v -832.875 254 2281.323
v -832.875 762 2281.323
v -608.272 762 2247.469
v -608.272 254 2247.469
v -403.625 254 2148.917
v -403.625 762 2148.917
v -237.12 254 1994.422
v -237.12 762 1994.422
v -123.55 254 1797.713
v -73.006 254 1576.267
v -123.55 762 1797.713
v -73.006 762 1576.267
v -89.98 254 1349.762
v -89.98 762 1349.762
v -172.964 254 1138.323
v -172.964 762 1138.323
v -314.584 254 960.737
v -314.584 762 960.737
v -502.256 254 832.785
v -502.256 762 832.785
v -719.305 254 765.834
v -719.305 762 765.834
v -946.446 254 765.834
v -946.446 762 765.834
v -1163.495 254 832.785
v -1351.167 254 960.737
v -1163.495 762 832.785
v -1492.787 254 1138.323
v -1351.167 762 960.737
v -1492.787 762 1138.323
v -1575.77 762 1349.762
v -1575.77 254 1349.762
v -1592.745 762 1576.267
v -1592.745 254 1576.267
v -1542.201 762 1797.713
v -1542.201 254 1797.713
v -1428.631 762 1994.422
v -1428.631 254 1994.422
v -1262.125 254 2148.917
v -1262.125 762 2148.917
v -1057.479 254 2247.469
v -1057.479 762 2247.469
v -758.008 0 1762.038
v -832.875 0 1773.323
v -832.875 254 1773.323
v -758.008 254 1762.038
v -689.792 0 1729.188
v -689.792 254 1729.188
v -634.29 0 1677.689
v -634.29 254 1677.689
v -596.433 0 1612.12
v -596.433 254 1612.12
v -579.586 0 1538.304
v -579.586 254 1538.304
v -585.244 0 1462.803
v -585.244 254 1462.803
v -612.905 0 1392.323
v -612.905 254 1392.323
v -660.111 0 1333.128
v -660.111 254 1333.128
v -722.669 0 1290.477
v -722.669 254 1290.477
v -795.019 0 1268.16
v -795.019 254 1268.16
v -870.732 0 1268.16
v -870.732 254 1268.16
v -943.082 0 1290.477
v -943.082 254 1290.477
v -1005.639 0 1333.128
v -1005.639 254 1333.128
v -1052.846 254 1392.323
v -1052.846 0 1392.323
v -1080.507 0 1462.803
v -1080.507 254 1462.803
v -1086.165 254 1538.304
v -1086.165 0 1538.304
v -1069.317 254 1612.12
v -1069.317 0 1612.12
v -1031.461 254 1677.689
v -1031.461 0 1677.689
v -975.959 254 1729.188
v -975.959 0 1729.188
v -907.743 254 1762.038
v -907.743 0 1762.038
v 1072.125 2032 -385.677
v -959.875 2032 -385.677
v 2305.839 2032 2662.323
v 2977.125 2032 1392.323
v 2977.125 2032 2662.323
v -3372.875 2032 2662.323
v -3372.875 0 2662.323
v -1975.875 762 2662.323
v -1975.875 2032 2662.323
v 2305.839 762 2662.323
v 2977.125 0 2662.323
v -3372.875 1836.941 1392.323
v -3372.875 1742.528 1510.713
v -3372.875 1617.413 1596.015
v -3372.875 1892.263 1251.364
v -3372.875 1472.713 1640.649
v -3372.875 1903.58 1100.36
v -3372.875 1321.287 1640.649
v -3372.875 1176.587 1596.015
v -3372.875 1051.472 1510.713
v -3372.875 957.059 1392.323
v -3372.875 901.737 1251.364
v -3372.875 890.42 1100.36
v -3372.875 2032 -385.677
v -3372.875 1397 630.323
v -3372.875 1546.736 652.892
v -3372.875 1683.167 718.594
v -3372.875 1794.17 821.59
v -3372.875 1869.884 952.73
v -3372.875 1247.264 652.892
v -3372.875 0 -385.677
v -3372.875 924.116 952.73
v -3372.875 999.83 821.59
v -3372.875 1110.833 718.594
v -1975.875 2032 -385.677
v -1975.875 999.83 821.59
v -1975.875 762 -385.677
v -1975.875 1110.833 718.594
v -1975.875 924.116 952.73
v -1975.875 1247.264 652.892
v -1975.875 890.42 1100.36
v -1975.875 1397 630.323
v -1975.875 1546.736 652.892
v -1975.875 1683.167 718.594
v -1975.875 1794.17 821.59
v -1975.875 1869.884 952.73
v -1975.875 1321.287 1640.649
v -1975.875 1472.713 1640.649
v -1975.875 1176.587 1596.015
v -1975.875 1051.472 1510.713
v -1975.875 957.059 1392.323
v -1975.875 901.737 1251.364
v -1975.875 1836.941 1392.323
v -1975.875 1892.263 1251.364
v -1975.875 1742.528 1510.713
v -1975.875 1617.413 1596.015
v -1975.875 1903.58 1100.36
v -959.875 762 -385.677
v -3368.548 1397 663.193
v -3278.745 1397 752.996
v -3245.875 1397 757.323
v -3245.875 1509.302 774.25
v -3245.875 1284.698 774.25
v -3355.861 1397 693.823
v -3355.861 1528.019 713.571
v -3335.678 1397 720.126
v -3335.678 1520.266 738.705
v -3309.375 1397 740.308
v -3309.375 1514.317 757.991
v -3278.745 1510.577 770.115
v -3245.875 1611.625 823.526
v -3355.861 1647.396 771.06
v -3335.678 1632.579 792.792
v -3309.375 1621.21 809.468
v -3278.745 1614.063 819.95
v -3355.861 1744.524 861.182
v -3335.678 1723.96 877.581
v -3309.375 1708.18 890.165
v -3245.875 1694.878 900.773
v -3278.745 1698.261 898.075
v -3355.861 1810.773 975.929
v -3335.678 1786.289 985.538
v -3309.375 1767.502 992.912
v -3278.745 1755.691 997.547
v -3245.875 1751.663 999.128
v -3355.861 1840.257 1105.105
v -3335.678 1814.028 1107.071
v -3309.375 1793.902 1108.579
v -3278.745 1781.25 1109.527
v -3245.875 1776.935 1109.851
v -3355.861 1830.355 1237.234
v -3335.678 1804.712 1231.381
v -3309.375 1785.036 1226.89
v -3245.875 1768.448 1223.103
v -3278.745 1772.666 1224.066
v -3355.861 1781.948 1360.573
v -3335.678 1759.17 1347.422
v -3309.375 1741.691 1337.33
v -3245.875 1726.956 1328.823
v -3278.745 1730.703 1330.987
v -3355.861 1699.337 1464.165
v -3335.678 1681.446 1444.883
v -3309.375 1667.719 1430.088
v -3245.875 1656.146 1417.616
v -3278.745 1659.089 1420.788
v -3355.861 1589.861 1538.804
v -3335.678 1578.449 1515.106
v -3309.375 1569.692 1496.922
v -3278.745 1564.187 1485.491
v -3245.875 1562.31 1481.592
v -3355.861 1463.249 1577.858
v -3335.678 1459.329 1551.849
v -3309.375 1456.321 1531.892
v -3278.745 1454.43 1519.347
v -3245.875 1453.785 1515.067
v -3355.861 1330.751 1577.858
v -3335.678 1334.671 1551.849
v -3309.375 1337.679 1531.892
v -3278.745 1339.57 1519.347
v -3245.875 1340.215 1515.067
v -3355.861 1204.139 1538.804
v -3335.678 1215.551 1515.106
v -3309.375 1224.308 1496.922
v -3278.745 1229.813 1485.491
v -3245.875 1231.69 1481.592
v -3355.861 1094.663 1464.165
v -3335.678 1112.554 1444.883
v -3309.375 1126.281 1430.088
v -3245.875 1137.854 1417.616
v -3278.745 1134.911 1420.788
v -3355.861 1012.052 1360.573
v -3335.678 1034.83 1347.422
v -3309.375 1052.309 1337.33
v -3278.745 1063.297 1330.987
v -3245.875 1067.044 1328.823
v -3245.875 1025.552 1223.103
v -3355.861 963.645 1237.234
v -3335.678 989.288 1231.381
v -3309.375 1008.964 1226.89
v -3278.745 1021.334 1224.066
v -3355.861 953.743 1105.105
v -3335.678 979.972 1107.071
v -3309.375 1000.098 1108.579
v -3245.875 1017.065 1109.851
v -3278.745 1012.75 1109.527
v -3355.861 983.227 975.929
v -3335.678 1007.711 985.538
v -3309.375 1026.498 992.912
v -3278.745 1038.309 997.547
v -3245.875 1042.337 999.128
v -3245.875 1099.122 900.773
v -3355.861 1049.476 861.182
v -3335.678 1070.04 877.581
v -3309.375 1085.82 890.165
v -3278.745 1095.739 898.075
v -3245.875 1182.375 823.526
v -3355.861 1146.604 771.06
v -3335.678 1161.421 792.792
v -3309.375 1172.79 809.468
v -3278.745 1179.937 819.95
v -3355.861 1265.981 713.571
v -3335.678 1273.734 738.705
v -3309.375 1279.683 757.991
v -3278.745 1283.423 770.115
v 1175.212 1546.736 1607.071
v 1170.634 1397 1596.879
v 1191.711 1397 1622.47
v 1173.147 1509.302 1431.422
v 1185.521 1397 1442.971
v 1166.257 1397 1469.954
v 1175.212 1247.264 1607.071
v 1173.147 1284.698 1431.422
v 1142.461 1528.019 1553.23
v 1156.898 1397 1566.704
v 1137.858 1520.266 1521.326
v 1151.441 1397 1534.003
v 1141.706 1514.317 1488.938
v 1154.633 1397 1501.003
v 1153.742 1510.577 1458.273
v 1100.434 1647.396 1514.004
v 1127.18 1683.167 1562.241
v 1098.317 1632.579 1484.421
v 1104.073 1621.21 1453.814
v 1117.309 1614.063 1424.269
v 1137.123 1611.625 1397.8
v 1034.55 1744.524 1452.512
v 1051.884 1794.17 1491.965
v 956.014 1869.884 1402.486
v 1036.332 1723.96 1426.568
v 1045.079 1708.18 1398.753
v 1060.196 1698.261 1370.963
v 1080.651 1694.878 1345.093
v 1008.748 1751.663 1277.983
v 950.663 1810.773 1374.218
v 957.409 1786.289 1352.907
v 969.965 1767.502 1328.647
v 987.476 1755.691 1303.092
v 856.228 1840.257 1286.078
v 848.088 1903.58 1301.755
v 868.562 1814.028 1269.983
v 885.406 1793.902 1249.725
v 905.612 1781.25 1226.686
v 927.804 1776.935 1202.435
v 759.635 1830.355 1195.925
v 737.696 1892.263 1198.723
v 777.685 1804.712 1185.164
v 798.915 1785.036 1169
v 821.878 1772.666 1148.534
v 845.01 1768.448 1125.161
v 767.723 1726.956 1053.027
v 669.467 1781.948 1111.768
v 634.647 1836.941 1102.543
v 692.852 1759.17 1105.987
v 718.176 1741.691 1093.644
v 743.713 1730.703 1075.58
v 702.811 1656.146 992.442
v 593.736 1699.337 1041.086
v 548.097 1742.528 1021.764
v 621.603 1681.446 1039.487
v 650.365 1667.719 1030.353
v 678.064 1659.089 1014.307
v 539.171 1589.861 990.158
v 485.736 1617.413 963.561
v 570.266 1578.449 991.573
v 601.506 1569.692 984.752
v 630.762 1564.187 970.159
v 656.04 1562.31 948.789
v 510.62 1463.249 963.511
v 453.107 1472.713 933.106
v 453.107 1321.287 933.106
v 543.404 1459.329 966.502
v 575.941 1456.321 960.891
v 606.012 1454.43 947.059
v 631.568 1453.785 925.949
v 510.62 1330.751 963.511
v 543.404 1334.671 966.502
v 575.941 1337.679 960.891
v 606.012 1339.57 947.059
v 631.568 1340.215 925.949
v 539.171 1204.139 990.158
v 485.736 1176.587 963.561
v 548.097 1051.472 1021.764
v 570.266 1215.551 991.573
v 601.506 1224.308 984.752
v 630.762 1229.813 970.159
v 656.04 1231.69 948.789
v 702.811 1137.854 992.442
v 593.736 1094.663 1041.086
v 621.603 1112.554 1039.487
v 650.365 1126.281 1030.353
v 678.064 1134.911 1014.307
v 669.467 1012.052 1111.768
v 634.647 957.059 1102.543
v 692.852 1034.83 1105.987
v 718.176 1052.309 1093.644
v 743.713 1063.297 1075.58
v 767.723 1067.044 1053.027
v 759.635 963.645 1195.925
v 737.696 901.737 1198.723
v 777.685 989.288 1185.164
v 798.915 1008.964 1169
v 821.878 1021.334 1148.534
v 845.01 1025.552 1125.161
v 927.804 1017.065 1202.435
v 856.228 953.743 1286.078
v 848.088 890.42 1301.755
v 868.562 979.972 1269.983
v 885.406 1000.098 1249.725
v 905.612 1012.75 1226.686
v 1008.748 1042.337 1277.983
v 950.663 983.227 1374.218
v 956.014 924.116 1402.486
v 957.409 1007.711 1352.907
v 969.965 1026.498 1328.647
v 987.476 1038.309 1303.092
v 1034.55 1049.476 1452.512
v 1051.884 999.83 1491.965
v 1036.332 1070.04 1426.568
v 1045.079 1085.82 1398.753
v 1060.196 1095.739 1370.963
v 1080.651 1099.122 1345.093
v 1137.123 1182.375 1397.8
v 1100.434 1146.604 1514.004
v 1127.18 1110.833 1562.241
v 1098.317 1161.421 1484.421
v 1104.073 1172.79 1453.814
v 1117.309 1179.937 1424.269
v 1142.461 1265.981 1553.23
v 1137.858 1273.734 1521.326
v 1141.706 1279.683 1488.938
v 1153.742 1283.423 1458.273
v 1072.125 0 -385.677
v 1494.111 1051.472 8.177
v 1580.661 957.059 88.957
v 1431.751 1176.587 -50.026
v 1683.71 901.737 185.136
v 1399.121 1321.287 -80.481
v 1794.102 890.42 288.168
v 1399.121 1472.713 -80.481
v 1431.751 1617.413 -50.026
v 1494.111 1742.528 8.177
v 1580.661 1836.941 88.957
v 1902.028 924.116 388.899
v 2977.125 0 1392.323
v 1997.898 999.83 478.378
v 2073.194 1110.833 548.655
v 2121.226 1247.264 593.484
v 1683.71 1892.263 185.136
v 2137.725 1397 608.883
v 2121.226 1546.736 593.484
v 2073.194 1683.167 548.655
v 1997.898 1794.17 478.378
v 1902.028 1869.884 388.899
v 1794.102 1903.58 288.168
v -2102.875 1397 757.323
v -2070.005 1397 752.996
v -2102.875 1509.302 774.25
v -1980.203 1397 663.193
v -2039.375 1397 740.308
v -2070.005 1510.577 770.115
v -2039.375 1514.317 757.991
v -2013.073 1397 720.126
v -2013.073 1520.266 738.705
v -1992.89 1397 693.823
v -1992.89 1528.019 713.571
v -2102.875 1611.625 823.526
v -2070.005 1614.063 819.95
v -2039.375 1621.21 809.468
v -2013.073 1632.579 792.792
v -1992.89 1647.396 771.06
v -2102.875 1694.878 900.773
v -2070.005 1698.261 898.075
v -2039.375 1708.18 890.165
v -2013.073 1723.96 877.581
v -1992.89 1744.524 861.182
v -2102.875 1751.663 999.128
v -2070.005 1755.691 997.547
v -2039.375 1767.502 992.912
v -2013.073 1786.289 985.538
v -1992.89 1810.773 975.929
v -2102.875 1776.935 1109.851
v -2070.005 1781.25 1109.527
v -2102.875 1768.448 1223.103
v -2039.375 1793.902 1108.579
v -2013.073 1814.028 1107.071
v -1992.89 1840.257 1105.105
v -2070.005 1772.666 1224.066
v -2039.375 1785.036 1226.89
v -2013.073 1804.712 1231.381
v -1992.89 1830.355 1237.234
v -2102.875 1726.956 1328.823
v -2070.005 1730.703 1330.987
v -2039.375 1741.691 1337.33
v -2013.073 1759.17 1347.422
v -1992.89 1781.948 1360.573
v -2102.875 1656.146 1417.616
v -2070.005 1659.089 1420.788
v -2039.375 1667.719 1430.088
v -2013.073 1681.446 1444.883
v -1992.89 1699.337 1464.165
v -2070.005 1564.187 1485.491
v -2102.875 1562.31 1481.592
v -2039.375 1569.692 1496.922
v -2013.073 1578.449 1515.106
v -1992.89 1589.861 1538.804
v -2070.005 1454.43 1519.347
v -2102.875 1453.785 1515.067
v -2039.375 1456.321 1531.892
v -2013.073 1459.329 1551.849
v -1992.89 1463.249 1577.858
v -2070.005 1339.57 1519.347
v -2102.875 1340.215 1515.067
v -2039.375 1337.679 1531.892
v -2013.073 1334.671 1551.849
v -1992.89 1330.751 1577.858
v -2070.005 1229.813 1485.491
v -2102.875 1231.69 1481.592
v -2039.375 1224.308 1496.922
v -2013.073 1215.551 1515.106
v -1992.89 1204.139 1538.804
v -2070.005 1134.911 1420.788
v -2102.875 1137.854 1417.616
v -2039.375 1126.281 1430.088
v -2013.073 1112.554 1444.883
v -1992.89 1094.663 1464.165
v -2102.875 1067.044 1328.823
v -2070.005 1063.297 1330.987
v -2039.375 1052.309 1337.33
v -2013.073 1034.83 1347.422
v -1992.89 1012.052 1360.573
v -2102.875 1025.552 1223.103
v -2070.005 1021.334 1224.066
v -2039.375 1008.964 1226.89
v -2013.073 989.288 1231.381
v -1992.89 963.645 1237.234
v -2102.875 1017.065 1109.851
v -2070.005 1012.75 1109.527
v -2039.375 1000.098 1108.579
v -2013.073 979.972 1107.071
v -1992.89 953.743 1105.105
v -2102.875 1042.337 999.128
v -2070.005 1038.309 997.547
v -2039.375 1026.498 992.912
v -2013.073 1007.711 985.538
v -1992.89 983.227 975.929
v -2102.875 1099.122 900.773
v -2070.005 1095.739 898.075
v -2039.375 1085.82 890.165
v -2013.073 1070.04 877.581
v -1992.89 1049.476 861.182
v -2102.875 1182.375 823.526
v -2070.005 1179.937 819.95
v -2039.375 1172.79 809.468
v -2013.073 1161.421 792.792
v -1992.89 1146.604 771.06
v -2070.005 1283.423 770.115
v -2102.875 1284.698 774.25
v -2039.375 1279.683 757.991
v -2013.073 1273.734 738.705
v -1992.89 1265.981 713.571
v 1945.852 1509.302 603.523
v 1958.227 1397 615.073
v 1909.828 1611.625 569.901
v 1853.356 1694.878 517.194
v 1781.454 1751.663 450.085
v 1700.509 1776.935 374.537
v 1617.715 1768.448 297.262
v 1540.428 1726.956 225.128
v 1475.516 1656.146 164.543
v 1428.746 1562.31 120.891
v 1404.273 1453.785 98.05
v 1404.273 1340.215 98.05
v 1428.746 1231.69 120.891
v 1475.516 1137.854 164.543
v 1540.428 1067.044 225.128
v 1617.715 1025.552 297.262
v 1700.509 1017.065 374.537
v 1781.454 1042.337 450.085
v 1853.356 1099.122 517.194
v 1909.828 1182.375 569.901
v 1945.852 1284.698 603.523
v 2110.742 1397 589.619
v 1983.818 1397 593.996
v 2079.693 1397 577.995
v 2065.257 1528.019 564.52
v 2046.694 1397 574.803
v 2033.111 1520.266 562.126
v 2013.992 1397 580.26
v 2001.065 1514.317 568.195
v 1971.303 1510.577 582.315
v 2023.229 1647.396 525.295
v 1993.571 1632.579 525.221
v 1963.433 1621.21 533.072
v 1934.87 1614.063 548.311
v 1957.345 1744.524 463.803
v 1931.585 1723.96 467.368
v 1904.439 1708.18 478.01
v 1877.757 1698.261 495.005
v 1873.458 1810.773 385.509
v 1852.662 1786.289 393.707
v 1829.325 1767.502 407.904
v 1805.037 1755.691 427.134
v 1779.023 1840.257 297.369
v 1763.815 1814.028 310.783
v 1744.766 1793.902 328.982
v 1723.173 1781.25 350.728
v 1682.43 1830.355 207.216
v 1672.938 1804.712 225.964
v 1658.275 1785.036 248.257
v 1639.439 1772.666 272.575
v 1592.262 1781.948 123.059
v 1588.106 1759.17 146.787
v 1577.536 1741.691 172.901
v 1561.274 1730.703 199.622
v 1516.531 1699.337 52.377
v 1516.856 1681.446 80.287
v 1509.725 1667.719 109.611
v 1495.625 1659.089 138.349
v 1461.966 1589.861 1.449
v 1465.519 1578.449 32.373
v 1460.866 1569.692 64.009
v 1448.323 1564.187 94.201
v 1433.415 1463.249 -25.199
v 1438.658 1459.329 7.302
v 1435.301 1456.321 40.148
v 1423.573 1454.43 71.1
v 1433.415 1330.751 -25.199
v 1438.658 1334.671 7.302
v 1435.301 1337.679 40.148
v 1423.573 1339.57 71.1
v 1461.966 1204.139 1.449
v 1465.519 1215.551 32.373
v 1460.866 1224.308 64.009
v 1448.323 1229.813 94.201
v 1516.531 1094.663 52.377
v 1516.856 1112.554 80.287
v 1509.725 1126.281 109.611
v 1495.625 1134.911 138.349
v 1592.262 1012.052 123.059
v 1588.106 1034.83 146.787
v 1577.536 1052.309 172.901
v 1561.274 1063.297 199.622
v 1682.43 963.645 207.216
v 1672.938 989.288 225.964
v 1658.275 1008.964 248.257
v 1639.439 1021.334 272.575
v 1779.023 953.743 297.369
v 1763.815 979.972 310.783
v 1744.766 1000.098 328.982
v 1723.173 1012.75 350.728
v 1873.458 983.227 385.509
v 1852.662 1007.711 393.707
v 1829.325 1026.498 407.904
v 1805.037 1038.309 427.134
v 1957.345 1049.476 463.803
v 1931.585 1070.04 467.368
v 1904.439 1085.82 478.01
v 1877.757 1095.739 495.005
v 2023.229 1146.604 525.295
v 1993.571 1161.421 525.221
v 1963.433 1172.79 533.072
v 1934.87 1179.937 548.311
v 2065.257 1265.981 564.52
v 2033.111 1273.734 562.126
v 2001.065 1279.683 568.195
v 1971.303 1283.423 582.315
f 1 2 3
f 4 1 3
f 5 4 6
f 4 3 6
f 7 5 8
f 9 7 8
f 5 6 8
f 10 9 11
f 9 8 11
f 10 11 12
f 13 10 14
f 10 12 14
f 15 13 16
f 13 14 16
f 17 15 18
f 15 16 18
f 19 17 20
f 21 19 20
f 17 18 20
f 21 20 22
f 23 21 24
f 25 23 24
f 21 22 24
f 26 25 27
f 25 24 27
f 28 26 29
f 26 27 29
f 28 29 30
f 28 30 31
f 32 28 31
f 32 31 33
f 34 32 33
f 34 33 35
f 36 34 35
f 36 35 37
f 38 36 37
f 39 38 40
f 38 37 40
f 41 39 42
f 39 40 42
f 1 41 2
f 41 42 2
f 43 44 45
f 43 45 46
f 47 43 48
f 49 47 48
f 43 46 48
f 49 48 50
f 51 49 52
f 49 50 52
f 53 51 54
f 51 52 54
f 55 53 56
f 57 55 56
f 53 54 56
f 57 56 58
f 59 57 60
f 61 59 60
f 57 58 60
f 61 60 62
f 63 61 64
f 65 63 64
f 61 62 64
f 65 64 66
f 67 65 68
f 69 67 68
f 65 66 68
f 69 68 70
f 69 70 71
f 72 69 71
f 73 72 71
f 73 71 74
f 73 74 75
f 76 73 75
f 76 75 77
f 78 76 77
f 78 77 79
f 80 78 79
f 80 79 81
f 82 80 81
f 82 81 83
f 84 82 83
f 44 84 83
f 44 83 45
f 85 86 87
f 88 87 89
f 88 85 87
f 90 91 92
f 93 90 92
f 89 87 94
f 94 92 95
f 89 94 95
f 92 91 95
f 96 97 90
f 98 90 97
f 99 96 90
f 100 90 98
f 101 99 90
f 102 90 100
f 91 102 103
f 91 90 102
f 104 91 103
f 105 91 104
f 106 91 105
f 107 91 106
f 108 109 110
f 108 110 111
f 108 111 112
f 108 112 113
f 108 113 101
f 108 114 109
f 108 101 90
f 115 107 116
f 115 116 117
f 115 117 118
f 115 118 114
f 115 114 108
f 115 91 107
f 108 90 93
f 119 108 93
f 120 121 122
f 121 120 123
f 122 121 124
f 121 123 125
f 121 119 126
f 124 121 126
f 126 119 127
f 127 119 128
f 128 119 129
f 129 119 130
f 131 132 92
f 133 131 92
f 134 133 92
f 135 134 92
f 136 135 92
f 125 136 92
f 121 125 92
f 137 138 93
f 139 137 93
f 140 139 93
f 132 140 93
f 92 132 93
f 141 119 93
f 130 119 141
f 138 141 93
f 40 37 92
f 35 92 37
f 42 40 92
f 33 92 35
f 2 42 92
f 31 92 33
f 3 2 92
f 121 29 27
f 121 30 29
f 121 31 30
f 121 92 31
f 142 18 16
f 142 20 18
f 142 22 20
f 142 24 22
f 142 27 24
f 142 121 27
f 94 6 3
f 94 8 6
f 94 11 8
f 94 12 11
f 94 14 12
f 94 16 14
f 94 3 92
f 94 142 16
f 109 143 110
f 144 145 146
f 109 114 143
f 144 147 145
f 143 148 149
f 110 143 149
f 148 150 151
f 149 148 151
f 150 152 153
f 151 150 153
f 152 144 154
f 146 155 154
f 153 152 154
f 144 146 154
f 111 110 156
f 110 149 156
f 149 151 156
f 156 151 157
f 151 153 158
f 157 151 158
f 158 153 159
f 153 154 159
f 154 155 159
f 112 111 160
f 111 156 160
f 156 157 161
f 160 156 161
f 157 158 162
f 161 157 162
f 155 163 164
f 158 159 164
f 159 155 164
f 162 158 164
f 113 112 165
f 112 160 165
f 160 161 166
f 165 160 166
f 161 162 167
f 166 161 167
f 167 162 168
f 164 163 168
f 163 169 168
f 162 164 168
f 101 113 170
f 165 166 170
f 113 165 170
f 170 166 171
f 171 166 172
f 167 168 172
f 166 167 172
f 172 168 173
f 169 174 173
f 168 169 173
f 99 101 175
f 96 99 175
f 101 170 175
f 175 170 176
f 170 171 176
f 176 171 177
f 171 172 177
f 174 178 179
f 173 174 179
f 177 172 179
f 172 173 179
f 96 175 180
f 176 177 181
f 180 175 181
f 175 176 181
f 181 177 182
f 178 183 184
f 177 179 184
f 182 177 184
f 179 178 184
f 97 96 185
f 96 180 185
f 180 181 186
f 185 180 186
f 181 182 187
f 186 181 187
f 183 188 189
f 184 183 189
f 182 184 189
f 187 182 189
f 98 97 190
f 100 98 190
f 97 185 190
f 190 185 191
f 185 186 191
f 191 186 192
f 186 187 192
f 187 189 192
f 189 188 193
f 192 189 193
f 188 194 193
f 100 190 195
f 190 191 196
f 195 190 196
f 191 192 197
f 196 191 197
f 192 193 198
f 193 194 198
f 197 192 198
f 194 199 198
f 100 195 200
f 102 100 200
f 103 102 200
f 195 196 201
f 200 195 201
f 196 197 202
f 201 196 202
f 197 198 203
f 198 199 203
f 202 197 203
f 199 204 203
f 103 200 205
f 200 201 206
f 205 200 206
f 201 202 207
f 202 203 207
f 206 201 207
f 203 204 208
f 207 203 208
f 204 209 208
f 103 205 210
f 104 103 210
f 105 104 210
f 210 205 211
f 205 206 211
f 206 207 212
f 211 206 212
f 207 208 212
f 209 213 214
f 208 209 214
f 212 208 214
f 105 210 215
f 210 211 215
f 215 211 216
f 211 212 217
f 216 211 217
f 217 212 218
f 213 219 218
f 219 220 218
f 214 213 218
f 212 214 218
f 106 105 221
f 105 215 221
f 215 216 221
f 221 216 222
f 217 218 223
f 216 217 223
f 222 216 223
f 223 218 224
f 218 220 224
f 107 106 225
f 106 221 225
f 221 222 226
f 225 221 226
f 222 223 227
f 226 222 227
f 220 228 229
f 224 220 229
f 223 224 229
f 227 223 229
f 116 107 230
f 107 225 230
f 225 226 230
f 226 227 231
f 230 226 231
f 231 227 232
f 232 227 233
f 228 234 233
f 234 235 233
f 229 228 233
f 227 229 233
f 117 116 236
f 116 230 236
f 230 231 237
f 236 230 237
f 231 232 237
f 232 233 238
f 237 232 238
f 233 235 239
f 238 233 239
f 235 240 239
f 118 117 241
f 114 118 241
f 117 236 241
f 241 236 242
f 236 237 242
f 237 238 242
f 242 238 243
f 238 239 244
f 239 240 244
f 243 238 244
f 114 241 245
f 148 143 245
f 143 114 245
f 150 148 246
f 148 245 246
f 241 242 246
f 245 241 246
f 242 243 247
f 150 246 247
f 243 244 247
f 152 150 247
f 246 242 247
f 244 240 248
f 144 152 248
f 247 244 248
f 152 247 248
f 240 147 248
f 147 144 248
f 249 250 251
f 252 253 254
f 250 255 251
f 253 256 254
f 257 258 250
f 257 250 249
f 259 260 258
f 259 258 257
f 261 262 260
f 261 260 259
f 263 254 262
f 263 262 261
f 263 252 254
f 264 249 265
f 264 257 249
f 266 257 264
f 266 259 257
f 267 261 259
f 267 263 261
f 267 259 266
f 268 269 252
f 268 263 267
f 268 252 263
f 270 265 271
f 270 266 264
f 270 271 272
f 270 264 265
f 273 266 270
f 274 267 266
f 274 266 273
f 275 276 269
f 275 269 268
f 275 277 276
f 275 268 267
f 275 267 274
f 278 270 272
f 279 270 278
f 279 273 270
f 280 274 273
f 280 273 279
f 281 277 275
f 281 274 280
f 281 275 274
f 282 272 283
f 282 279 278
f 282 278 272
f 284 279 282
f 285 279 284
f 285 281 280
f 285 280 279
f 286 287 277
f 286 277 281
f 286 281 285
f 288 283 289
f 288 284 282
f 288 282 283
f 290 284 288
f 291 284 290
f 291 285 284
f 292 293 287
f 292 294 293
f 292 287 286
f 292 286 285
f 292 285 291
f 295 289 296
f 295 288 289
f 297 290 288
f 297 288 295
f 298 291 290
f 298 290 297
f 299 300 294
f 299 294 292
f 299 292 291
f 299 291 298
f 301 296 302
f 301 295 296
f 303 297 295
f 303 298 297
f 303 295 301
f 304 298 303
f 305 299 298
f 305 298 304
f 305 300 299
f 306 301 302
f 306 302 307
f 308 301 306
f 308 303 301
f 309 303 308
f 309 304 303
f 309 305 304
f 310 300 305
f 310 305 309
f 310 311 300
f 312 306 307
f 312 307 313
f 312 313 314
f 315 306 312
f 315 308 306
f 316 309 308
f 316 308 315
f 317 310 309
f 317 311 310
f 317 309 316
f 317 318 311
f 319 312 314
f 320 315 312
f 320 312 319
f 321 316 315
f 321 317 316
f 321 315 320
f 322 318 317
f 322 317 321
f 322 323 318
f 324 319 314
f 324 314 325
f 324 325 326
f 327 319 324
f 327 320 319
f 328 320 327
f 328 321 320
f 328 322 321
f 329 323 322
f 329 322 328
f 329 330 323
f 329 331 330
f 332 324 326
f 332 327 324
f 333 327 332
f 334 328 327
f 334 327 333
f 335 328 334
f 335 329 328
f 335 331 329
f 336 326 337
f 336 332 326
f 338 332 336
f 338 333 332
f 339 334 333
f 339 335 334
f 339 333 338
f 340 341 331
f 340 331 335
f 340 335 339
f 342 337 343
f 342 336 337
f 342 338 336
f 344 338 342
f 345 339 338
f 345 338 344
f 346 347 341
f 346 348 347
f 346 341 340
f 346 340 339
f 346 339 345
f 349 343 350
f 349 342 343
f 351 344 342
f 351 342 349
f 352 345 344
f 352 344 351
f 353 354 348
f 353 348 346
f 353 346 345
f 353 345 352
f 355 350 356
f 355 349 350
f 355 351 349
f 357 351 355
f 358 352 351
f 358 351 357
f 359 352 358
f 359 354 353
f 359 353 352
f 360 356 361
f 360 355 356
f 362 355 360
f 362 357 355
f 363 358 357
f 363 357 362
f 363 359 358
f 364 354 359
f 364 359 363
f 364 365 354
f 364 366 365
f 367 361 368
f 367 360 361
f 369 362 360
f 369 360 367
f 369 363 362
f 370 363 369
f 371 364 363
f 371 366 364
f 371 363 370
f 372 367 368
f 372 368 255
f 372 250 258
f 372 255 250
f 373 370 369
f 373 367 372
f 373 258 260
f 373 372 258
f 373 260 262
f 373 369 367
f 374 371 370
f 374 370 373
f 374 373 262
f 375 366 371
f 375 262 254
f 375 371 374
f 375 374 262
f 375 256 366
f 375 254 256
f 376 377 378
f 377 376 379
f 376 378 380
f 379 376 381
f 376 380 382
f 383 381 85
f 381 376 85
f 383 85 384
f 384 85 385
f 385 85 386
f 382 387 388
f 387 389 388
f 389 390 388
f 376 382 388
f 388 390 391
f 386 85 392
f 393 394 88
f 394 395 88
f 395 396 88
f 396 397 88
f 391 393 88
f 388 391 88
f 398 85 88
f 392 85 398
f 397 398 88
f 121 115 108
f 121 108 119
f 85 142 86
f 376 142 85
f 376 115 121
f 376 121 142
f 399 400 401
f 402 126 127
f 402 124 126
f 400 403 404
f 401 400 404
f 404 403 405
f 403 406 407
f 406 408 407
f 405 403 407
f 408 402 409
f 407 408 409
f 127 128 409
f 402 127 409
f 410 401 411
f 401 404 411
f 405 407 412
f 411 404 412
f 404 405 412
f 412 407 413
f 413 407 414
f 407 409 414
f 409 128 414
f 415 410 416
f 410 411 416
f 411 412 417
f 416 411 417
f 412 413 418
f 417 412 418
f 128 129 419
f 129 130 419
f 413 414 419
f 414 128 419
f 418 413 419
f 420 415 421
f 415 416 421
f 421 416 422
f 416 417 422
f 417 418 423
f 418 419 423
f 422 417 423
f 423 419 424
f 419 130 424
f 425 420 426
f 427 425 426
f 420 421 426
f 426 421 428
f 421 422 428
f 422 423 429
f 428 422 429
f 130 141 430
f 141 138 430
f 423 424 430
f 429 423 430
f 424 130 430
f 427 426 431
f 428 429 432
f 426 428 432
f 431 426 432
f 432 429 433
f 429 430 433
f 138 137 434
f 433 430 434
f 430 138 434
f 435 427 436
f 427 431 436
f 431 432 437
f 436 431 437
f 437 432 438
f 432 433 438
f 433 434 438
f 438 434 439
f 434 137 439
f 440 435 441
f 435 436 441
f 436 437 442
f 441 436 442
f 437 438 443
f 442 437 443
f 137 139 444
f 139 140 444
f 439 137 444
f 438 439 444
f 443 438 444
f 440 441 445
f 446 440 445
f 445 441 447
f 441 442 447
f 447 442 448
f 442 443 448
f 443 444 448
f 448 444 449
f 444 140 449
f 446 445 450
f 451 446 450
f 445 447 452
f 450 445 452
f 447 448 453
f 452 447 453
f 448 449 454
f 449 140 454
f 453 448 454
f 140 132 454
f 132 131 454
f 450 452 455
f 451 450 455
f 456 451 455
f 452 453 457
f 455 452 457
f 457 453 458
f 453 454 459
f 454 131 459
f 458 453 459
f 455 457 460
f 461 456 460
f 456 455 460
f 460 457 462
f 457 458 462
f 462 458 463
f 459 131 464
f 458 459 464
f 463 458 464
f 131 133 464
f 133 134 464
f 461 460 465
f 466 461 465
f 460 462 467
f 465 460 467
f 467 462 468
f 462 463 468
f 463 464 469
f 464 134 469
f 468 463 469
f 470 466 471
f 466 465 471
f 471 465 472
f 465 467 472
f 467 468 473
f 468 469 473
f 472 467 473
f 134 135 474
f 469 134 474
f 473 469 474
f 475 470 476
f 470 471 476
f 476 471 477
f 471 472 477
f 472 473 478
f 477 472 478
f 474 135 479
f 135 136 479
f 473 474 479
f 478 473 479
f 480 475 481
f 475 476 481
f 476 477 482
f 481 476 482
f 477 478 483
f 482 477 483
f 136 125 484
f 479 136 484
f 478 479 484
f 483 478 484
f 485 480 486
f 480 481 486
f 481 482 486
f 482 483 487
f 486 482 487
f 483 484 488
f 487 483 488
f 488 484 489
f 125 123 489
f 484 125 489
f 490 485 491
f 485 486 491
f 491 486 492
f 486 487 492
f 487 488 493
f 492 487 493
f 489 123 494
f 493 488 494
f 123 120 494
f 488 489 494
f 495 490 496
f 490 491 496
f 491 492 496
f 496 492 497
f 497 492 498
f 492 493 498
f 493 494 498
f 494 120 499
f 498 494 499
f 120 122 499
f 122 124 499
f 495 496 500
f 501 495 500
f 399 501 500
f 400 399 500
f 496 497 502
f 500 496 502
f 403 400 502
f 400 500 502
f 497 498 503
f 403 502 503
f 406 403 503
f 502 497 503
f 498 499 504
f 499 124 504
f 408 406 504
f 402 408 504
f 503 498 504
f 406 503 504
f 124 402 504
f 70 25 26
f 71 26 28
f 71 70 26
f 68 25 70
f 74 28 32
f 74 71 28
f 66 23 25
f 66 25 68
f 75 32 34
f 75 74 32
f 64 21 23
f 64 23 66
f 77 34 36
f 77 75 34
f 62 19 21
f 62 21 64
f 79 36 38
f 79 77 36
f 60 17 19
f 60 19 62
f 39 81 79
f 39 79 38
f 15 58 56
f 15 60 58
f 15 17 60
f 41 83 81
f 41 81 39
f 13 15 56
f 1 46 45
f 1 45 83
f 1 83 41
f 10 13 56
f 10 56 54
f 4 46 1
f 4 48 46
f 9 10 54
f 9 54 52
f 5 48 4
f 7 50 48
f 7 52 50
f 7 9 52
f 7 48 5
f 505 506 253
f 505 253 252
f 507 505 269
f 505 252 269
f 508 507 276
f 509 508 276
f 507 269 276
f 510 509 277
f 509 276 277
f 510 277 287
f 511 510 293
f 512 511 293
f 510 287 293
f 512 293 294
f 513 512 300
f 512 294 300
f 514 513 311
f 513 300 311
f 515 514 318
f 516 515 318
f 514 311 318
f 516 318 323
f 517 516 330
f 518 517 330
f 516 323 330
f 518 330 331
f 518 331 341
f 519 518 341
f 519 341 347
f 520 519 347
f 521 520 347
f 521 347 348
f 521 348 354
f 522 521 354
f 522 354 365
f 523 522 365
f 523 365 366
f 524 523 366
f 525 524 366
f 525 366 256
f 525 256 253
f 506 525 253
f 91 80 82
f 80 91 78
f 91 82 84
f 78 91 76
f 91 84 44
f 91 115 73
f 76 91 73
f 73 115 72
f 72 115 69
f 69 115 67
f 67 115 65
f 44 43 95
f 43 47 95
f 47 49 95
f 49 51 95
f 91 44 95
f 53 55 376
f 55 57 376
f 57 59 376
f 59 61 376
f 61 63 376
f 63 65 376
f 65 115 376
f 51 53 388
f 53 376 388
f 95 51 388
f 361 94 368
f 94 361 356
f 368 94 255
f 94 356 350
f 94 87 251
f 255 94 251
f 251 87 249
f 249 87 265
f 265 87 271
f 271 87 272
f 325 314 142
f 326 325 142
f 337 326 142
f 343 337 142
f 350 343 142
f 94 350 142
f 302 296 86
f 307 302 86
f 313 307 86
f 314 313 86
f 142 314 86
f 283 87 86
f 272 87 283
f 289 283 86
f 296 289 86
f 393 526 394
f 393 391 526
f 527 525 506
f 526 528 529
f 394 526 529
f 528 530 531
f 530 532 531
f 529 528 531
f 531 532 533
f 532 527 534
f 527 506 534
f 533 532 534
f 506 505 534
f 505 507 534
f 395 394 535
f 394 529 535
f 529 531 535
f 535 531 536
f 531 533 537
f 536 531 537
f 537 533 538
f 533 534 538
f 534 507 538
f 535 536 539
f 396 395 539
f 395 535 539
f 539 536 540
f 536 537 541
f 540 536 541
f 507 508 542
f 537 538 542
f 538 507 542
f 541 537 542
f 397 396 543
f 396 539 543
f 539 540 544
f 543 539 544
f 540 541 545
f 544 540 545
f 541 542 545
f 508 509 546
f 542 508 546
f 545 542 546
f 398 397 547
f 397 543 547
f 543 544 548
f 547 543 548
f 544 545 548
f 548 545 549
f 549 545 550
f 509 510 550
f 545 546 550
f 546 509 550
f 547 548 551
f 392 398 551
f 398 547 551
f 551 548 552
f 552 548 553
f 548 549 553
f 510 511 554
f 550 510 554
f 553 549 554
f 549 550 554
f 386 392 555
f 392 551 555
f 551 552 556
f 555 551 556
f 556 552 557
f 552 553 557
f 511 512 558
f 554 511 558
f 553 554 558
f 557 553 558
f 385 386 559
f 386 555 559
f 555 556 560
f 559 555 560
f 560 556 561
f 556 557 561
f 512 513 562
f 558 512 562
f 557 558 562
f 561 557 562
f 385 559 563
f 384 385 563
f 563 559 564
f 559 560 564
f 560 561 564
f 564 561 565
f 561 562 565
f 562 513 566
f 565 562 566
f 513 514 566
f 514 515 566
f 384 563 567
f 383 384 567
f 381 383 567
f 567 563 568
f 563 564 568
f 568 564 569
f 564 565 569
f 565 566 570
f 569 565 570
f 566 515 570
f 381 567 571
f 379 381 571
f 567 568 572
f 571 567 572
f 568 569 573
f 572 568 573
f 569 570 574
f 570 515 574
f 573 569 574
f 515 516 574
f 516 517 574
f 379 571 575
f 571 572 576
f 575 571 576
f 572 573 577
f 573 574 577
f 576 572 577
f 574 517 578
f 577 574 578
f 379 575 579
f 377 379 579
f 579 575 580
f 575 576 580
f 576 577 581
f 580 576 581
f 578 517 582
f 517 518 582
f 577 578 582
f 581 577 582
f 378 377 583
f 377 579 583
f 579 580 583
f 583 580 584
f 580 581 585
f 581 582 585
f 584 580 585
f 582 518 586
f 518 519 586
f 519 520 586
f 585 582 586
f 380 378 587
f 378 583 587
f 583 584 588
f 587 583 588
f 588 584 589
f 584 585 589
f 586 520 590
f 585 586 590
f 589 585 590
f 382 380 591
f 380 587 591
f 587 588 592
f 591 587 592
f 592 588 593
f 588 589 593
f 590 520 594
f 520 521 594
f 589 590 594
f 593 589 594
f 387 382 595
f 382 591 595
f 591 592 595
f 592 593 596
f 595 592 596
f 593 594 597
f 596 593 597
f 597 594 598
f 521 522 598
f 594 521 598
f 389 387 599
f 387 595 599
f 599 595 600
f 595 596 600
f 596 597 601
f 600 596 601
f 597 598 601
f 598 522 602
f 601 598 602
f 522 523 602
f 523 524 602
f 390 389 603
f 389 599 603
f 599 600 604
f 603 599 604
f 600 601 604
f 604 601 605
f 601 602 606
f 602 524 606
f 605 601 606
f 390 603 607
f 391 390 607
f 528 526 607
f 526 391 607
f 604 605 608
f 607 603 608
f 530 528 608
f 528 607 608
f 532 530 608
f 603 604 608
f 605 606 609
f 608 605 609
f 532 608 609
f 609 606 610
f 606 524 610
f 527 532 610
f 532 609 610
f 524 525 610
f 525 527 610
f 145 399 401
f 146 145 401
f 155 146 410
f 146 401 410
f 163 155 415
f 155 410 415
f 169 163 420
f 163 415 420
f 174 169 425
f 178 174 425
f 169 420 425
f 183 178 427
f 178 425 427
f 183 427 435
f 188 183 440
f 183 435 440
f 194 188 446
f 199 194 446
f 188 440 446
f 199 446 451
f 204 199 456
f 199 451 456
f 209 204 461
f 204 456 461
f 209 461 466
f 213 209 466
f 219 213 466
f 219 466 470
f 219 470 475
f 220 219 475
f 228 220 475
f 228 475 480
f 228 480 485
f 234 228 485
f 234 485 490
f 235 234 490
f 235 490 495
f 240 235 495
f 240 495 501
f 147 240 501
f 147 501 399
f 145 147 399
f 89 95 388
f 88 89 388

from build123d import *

# Parameters (mm, degrees)
SKETCH1_W           = 6350
SKETCH1_H           = 3048
BOSS_EXTRUDE1_DEPTH = 2032
CUT_EXTRUDE1_DEPTH  = 4754.238435433
CUT_EXTRUDE2_DEPTH  = 1270
SKETCH4_R           = 762
CUT_EXTRUDE3_DEPTH  = 508
SKETCH5_R           = 254
CUT_EXTRUDE4_DEPTH  = 4651.326399736
SKETCH6_R           = 381
CUT_EXTRUDE5_DEPTH  = 5980.063176597
FILLET1_R           = 127
SKETCH7_R           = 381
CUT_EXTRUDE6_DEPTH  = 4504.645028622
FILLET2_R           = 127


with BuildPart() as part:
    # Sketch1 → Boss-Extrude1 (new body)
    with BuildSketch(Plane(origin=(0, 0, 0), x_dir=(1, 0, 0), z_dir=(0, 1, 0))):
        with Locations((-197.875354108, -1138.322946176)):
            Rectangle(SKETCH1_W, SKETCH1_H)
    extrude(amount=BOSS_EXTRUDE1_DEPTH)

    # Sketch2 → Cut-Extrude1 (cut, through all)
    with BuildSketch(Plane(origin=(0, 2032, 0), x_dir=(1, 0, 0), z_dir=(0, 1, 0))):
        Polygon((1072.124645892, 385.677053824), (2977.124645892, -1392.322946176), (2977.124645892, 385.677053824), align=None)
    extrude(amount=-CUT_EXTRUDE1_DEPTH, mode=Mode.SUBTRACT)

    # Sketch3 → Cut-Extrude2 (cut)
    with BuildSketch(Plane(origin=(0, 2032, 0), x_dir=(1, 0, 0), z_dir=(0, 1, 0))):
        Polygon((-1975.875354108, 385.677053824), (-1975.875354108, -2662.322946176), (2305.838931607, -2662.322946176), (-959.875354108, 385.677053824), align=None)
    extrude(amount=-CUT_EXTRUDE2_DEPTH, mode=Mode.SUBTRACT)

    # Sketch4 → Cut-Extrude3 (cut)
    with BuildSketch(Plane(origin=(0, 762, 0), x_dir=(1, 0, 0), z_dir=(0, 1, 0))):
        with Locations(Location((-832.875354108, -1519.322946176, 0), (0, 0, 270))):
            Circle(SKETCH4_R)
    extrude(amount=-CUT_EXTRUDE3_DEPTH, mode=Mode.SUBTRACT)

    # Sketch5 → Cut-Extrude4 (cut, through all)
    with BuildSketch(Plane(origin=(0, 254, 0), x_dir=(1, 0, 0), z_dir=(0, 1, 0))):
        with Locations(Location((-832.875354108, -1519.322946176, 0), (0, 0, 270))):
            Circle(SKETCH5_R)
    extrude(amount=-CUT_EXTRUDE4_DEPTH, mode=Mode.SUBTRACT)

    # Sketch6 → Cut-Extrude5 (cut, through all)
    with BuildSketch(Plane(origin=(-1975.875354108, 0, 0), x_dir=(0, 0, -1), z_dir=(1, 0, 0))):
        with Locations((-1138.322946176, 1397)):
            Circle(SKETCH6_R)
    extrude(amount=-CUT_EXTRUDE5_DEPTH, mode=Mode.SUBTRACT)

    # Fillet1
    fillet1_edges = [part.edges().sort_by_distance(p)[0] for p in [
        (-3372.875354108, 1397, 1519.322946176),
        (-1975.875354108, 1397, 1519.322946176),
    ]]
    fillet(fillet1_edges, radius=FILLET1_R)

    # Sketch7 → Cut-Extrude6 (cut, through all)
    with BuildSketch(Plane(origin=(-254.497358912, 0, 272.675741692), x_dir=(0.7310552682428689, 0, 0.6823182503600114), z_dir=(-0.6823182503600114, 0, 0.7310552682428689))):
        with Locations((1470.247233198, 1397)):
            Circle(SKETCH7_R)
    extrude(amount=-CUT_EXTRUDE6_DEPTH, mode=Mode.SUBTRACT)

    # Fillet2
    fillet2_edges = [part.edges().sort_by_distance(p)[0] for p in [
        (1487.816821118, 1397, 2.30230972),
        (541.802569337, 1397, 1015.889008057),
    ]]
    fillet(fillet2_edges, radius=FILLET2_R)


solid = part.part
